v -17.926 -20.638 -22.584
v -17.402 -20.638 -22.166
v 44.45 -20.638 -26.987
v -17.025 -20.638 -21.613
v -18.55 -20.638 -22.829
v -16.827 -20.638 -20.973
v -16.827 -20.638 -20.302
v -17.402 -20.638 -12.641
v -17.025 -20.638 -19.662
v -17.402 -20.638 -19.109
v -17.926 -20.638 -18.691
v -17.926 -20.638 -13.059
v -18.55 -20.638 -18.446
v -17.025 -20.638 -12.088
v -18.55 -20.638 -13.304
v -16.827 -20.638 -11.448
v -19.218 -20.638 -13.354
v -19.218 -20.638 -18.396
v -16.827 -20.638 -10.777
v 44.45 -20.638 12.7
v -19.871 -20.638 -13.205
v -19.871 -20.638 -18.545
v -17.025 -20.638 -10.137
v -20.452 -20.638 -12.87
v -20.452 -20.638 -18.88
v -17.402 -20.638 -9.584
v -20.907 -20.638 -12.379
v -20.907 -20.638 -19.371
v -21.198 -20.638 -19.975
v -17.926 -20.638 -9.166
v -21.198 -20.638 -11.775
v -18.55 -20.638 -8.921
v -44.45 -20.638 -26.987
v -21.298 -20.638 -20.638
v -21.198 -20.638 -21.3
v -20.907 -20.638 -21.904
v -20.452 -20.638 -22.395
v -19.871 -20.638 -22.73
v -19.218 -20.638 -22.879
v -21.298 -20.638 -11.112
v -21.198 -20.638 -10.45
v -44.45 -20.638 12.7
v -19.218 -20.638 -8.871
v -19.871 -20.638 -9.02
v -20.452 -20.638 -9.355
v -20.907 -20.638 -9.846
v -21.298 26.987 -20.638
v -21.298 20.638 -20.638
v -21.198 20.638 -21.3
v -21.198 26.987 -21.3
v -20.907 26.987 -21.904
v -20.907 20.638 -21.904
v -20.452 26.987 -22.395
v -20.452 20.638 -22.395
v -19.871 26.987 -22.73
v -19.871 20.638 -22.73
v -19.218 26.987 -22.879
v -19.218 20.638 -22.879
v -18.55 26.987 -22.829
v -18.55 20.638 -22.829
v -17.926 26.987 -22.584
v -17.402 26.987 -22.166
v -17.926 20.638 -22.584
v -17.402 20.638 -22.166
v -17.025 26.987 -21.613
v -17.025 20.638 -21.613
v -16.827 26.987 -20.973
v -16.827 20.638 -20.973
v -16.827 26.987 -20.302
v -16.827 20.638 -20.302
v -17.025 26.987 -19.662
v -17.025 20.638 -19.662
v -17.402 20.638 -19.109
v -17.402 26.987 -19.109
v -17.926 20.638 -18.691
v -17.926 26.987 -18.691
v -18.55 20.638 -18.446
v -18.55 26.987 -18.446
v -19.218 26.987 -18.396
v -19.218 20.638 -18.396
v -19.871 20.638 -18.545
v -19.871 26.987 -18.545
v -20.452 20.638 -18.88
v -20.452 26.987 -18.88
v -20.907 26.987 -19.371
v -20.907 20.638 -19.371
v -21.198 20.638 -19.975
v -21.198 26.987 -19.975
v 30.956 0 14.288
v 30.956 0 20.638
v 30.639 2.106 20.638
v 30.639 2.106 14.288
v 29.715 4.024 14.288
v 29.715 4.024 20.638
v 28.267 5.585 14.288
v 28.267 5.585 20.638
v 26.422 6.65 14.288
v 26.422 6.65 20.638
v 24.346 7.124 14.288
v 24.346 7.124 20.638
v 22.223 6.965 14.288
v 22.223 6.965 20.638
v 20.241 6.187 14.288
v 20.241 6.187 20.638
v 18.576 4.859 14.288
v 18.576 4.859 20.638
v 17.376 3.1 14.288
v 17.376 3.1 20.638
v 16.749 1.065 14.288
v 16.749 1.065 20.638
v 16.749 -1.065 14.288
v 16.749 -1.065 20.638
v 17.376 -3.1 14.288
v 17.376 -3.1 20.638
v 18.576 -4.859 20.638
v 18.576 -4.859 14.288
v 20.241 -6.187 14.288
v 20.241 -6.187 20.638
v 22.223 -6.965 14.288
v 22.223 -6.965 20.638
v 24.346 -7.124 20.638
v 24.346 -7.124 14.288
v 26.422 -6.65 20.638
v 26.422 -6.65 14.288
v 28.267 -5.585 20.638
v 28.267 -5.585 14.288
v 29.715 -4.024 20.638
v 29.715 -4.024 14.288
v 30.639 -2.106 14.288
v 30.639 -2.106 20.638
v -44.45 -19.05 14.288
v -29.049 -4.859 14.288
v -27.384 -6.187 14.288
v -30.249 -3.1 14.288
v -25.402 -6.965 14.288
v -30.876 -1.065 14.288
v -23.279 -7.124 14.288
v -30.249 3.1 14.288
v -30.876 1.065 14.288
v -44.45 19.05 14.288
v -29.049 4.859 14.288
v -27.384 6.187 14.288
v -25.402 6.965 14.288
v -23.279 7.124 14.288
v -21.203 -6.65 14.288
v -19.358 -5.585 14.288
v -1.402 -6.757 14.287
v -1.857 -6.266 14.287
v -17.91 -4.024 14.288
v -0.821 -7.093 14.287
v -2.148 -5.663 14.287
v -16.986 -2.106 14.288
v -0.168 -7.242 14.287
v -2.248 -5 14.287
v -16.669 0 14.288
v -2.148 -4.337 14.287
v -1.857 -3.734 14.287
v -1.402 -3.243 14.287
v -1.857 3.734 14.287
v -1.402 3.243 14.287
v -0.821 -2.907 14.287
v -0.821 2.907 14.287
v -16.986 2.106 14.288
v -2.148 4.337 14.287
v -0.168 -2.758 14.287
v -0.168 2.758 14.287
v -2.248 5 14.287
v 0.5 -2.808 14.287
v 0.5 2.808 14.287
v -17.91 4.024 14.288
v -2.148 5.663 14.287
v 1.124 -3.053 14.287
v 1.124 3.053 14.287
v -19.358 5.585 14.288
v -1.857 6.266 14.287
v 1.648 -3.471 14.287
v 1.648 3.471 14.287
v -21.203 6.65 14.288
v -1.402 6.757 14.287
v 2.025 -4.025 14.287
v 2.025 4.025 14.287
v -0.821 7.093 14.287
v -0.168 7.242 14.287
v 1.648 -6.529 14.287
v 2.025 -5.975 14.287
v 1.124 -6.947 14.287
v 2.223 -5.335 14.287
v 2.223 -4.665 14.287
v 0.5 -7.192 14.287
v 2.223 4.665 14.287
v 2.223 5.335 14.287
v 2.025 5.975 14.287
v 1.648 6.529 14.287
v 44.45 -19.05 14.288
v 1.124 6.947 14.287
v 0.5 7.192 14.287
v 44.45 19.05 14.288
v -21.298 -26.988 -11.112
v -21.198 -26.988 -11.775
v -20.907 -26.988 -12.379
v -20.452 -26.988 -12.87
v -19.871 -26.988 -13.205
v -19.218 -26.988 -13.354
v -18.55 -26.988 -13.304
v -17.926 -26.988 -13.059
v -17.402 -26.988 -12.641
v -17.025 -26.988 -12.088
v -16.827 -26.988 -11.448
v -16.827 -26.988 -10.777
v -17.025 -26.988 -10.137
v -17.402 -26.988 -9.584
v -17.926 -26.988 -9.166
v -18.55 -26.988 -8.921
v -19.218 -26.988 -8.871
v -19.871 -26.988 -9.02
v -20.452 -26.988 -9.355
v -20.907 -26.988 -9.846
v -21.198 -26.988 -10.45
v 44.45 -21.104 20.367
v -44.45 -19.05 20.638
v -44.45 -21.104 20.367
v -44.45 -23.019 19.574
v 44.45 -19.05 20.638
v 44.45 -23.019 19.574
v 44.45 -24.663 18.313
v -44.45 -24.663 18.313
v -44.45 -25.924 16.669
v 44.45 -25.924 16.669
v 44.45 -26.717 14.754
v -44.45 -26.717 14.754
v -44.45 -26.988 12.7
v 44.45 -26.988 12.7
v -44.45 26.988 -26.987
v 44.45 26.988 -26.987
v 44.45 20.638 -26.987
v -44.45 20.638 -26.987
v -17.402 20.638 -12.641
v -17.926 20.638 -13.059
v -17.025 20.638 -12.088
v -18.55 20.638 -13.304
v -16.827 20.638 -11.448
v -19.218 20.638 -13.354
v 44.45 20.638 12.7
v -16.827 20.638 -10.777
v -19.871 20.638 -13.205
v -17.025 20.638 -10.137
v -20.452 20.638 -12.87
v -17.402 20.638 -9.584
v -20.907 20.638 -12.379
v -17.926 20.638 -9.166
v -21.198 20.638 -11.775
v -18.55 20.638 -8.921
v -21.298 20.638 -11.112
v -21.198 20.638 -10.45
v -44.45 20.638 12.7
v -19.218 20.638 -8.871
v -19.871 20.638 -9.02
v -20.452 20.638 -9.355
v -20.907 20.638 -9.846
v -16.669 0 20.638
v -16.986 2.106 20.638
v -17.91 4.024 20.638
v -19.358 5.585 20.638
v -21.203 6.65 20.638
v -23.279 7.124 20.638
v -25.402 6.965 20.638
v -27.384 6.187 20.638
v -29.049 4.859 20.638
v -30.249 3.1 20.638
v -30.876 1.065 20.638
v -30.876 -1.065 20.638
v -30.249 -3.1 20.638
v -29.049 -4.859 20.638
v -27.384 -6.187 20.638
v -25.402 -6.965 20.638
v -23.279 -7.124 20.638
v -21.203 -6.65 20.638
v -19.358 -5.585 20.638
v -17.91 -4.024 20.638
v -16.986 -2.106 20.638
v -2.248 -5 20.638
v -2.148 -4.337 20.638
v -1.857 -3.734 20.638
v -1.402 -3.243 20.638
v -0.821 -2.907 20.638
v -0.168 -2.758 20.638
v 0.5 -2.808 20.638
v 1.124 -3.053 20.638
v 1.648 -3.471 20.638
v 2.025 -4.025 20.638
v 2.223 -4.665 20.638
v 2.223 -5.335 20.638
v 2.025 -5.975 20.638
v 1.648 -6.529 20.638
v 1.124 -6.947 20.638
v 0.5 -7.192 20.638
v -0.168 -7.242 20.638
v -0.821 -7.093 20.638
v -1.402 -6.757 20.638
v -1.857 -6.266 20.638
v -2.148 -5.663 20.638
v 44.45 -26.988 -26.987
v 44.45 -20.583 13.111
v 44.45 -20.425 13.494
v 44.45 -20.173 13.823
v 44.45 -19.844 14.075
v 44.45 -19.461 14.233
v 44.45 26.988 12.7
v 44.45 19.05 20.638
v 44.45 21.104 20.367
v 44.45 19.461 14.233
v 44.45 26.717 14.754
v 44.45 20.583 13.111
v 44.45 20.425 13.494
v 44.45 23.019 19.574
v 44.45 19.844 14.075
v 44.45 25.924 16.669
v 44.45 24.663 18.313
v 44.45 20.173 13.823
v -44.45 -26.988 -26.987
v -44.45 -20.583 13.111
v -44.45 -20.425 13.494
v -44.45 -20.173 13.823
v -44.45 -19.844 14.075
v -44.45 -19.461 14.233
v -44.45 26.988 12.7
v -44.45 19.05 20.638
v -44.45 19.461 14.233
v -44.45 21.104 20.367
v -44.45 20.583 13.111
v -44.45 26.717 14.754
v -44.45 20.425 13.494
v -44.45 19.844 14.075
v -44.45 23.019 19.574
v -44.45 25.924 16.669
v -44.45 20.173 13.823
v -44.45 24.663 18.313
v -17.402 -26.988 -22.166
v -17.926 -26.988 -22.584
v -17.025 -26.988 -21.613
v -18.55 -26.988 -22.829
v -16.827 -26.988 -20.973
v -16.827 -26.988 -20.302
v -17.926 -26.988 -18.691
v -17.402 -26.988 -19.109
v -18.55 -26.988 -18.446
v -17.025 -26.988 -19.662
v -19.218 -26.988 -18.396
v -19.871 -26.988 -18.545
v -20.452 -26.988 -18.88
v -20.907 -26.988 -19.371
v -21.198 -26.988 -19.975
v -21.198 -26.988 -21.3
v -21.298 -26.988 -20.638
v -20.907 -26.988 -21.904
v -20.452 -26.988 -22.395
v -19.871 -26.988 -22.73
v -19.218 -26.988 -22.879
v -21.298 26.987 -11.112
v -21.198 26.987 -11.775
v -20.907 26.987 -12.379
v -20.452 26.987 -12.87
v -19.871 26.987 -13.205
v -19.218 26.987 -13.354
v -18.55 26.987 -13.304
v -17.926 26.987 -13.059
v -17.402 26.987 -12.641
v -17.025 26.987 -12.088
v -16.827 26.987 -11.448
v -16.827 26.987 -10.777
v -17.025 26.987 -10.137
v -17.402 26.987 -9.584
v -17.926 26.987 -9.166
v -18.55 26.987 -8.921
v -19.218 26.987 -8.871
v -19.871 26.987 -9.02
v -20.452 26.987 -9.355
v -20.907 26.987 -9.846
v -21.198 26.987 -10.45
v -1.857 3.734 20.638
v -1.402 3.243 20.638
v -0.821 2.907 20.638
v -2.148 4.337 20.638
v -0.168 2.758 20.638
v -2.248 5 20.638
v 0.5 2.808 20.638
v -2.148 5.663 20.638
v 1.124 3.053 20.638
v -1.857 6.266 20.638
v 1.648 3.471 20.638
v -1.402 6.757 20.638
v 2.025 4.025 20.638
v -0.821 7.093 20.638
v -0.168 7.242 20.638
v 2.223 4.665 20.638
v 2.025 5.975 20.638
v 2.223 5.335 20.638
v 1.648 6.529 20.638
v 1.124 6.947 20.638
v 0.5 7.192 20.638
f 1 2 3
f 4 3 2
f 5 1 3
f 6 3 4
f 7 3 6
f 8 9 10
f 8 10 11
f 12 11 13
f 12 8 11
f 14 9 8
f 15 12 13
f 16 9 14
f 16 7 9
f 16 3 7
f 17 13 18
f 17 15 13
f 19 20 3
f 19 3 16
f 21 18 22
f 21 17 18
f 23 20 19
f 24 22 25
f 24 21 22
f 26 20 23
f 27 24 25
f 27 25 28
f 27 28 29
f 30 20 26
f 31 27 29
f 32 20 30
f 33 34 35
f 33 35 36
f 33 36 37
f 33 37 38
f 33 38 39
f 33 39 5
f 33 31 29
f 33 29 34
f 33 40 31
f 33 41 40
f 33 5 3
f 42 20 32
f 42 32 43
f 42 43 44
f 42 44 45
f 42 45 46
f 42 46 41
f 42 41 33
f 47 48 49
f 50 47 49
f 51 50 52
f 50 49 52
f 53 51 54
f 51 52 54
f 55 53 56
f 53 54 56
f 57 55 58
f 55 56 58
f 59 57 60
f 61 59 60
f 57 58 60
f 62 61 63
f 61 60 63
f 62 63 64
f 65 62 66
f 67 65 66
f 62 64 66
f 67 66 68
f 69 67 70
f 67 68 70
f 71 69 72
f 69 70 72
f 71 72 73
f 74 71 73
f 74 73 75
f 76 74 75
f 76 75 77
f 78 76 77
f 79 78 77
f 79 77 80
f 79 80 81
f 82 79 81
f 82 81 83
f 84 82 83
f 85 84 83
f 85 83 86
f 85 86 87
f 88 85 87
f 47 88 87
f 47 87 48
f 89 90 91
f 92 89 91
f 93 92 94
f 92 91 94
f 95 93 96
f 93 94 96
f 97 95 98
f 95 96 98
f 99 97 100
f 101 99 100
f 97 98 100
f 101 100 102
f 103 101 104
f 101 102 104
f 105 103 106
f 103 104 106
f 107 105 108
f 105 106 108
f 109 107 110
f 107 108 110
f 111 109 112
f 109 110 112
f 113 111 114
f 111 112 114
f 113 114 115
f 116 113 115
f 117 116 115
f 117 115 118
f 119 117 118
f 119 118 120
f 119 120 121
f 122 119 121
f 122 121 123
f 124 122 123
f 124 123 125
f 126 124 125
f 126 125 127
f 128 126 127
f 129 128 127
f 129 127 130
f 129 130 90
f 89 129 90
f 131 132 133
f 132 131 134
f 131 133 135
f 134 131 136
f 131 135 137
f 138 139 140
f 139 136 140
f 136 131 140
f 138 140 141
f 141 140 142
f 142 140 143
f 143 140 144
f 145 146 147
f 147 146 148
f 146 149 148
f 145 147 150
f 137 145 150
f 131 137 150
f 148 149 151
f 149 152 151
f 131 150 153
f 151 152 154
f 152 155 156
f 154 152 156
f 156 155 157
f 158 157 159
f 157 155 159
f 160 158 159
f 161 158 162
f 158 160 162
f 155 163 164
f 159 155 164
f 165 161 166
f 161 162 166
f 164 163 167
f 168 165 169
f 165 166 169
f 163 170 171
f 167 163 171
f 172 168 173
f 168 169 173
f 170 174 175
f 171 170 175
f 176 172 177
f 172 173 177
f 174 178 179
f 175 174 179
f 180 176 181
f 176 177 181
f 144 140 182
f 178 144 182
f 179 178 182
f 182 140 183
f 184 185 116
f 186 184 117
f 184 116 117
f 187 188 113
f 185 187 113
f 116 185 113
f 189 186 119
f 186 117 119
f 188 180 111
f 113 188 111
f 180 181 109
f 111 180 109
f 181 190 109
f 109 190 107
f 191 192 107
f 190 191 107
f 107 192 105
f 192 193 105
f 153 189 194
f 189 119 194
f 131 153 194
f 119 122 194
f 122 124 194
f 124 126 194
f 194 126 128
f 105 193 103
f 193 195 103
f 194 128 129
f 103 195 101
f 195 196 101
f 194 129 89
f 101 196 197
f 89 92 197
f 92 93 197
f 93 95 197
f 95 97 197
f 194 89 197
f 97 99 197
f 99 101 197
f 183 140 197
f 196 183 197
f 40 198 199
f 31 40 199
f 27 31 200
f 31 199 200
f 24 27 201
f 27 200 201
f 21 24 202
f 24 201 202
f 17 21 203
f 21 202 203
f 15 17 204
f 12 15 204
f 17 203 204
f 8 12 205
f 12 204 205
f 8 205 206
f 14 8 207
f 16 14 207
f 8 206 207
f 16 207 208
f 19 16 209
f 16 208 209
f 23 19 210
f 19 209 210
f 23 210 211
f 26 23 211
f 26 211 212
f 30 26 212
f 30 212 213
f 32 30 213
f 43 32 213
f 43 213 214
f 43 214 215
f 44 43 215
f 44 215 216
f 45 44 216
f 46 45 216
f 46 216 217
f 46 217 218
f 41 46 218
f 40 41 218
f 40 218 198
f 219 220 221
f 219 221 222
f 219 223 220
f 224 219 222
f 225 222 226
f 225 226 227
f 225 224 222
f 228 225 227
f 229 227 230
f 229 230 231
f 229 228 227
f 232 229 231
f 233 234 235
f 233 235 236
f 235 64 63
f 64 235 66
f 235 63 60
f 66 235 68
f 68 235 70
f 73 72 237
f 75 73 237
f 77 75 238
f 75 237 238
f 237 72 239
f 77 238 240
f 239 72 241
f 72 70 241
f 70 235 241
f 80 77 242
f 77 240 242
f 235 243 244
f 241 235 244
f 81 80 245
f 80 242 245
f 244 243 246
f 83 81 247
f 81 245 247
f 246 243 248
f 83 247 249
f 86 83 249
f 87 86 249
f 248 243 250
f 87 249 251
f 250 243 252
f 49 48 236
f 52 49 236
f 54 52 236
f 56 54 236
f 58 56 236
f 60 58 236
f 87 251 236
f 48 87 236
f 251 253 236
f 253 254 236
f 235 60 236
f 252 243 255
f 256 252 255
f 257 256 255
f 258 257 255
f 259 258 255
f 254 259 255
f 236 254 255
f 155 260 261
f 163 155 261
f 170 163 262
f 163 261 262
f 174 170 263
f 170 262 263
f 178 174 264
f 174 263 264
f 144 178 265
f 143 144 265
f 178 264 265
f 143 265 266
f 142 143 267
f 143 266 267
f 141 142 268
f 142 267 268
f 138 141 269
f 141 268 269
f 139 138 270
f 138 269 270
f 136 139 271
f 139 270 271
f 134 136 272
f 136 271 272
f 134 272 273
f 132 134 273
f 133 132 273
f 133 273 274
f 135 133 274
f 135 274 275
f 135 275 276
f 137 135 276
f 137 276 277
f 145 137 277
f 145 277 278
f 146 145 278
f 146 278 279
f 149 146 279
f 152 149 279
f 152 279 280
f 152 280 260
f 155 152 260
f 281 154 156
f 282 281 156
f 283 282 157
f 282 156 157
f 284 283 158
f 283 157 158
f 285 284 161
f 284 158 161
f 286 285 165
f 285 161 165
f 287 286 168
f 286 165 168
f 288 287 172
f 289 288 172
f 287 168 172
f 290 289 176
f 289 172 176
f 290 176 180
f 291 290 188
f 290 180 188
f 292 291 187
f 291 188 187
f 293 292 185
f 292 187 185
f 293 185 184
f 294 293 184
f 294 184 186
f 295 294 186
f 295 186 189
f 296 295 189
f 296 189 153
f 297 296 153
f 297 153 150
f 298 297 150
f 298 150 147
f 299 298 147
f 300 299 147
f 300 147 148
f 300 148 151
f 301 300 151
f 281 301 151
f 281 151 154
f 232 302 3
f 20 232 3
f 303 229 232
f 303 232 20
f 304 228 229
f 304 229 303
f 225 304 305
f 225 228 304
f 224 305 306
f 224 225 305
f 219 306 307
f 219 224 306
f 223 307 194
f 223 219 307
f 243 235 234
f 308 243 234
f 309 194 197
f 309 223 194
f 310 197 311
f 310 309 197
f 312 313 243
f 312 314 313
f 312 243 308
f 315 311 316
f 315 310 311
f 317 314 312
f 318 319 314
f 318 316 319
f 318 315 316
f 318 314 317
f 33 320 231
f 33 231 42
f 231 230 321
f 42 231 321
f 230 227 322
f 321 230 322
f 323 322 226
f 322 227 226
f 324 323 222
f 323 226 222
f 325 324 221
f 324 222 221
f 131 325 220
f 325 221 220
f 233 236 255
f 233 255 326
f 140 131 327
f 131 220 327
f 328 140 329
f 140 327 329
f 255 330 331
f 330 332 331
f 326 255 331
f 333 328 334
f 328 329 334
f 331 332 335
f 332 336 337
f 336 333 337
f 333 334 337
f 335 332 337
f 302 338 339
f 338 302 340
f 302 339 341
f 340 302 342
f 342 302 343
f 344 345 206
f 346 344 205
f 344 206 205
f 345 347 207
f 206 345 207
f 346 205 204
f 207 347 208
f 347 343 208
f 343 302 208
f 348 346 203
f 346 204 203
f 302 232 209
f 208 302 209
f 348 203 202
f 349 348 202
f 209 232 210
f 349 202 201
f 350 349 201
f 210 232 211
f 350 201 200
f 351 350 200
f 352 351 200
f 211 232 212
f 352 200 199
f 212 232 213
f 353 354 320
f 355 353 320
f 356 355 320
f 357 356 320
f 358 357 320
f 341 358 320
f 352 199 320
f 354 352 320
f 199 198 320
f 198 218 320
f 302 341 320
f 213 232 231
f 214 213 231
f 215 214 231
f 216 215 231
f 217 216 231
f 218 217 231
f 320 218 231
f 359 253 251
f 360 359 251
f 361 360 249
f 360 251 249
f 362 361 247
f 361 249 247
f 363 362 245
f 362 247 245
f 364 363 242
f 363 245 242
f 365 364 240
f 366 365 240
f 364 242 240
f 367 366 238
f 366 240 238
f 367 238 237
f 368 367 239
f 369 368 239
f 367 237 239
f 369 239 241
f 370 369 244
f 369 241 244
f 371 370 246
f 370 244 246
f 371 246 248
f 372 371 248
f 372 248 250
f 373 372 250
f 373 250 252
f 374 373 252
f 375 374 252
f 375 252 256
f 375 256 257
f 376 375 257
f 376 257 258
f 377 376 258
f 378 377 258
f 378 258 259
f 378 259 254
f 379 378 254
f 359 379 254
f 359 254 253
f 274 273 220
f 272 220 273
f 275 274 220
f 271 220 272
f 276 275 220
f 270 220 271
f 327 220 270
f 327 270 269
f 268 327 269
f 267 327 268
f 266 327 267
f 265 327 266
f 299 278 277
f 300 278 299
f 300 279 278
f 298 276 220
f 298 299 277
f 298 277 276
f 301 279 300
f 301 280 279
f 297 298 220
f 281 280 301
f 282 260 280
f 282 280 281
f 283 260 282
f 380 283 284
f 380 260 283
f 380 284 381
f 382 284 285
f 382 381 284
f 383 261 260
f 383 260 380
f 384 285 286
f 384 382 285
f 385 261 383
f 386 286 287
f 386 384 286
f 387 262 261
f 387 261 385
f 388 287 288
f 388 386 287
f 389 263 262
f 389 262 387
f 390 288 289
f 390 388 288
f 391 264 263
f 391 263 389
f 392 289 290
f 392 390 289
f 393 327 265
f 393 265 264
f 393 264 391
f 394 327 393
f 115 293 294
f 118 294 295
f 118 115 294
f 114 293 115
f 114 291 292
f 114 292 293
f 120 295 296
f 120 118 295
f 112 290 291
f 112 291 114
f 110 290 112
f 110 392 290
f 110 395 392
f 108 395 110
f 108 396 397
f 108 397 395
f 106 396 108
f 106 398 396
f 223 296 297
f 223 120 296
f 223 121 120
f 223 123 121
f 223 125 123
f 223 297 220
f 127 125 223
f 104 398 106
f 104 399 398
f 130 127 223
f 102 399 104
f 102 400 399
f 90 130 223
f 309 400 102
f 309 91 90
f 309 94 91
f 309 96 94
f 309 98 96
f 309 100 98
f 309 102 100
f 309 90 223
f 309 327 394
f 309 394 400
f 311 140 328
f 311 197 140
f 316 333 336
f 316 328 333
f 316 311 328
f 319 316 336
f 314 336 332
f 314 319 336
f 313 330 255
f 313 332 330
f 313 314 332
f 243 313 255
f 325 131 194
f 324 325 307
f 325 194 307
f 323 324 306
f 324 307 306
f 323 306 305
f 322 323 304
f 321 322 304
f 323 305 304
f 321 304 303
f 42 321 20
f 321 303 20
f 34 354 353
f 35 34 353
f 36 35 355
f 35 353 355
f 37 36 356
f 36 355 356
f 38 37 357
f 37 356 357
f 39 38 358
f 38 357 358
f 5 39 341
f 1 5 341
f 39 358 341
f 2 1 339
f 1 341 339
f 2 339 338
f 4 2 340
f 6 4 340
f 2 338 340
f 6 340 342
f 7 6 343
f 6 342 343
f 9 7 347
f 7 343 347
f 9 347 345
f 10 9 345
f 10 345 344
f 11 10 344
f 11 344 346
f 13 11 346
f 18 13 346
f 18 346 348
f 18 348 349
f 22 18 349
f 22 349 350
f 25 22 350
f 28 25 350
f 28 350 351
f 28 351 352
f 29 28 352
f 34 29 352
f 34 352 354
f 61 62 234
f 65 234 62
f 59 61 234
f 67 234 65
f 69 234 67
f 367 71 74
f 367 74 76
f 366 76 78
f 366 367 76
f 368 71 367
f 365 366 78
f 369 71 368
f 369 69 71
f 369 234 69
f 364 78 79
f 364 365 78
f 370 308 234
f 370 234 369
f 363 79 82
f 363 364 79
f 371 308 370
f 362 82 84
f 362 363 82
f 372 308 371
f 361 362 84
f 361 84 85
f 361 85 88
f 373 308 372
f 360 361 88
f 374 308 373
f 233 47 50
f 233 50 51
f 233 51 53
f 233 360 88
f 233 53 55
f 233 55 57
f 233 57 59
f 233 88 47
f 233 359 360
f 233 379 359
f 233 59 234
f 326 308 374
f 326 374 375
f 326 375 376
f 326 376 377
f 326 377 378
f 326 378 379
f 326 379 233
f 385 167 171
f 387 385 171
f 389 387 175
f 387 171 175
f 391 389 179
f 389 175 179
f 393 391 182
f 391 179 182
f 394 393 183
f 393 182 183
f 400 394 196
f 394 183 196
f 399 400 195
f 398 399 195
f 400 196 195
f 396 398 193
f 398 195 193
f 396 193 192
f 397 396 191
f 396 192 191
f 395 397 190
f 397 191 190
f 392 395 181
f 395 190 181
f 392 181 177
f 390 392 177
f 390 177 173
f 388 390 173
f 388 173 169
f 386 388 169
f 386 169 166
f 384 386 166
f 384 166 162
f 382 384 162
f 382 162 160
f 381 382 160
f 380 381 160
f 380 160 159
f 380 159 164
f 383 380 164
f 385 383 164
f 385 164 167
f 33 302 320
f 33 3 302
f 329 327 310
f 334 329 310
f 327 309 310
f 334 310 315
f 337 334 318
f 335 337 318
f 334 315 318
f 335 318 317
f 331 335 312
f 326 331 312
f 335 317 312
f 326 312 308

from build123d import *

# Parameters (mm, degrees)
SKETCH1_W                   = 88.9
SKETCH1_H                   = 53.975
BOSS_EXTRUDE1_DEPTH         = 20.6375
FILLET1_R                   = 7.9375
SKETCH3_W                   = 88.9
SKETCH3_H                   = 53.975
BOSS_EXTRUDE2_DEPTH         = 6.35
SHELL1_T                    = -6.35
SKETCH2_R                   = 7.14375
CUT_EXTRUDE1_DEPTH          = 47.625
F_16_0_177_DIAMETER_HOLE1_D = 4.4958
F_16_0_177_DIAMETER_HOLE2_D = 4.4958


with BuildPart() as part:
    # Sketch1 → Boss-Extrude1 (new body, symmetric)
    with BuildSketch(Plane.XY):
        Rectangle(SKETCH1_W, SKETCH1_H)
    extrude(amount=BOSS_EXTRUDE1_DEPTH, both=True)

    # Fillet1
    fillet1_edges = [part.edges().sort_by_distance(p)[0] for p in [
        (0, 26.9875, 20.6375),
        (0, -26.9875, 20.6375),
    ]]
    fillet(fillet1_edges, radius=FILLET1_R)

    # Sketch3 → Boss-Extrude2 (add)
    with BuildSketch(Plane(origin=(0, 0, -20.6375), x_dir=(-1, 0, 0), z_dir=(0, 0, -1))):
        Rectangle(SKETCH3_W, SKETCH3_H)
    extrude(amount=BOSS_EXTRUDE2_DEPTH)

    # Shell1
    shell1_openings = [part.faces().sort_by_distance(p)[0] for p in [
        (0, 0, -26.9875),
        (44.45, 0, 2.664636692),
        (-44.45, 0, 2.664636692),
    ]]
    offset(amount=SHELL1_T, openings=shell1_openings, kind=Kind.INTERSECTION)

    # Sketch2 → Cut-Extrude1 (cut)
    with BuildSketch(Plane.XY.offset(20.6375)):
        with Locations((-23.8125, 0)):
            Circle(SKETCH2_R)
        with Locations((23.8125, 0)):
            Circle(SKETCH2_R)
    extrude(amount=-CUT_EXTRUDE1_DEPTH, mode=Mode.SUBTRACT)

    # #16 (0.177) Diameter Hole1 (through all)
    with Locations(Plane(origin=(0, 26.9875, 0), x_dir=(1, 0, 0), z_dir=(0, 1, 0))):
        with Locations((-19.05, 11.1125), (-19.05, 20.6375)):
            Hole(F_16_0_177_DIAMETER_HOLE1_D / 2)

    # #16 (0.177) Diameter Hole2 (through all)
    with Locations(Plane.XY.offset(20.6375)):
        with Locations((0, -5), (0, 5)):
            Hole(F_16_0_177_DIAMETER_HOLE2_D / 2)


solid = part.part
